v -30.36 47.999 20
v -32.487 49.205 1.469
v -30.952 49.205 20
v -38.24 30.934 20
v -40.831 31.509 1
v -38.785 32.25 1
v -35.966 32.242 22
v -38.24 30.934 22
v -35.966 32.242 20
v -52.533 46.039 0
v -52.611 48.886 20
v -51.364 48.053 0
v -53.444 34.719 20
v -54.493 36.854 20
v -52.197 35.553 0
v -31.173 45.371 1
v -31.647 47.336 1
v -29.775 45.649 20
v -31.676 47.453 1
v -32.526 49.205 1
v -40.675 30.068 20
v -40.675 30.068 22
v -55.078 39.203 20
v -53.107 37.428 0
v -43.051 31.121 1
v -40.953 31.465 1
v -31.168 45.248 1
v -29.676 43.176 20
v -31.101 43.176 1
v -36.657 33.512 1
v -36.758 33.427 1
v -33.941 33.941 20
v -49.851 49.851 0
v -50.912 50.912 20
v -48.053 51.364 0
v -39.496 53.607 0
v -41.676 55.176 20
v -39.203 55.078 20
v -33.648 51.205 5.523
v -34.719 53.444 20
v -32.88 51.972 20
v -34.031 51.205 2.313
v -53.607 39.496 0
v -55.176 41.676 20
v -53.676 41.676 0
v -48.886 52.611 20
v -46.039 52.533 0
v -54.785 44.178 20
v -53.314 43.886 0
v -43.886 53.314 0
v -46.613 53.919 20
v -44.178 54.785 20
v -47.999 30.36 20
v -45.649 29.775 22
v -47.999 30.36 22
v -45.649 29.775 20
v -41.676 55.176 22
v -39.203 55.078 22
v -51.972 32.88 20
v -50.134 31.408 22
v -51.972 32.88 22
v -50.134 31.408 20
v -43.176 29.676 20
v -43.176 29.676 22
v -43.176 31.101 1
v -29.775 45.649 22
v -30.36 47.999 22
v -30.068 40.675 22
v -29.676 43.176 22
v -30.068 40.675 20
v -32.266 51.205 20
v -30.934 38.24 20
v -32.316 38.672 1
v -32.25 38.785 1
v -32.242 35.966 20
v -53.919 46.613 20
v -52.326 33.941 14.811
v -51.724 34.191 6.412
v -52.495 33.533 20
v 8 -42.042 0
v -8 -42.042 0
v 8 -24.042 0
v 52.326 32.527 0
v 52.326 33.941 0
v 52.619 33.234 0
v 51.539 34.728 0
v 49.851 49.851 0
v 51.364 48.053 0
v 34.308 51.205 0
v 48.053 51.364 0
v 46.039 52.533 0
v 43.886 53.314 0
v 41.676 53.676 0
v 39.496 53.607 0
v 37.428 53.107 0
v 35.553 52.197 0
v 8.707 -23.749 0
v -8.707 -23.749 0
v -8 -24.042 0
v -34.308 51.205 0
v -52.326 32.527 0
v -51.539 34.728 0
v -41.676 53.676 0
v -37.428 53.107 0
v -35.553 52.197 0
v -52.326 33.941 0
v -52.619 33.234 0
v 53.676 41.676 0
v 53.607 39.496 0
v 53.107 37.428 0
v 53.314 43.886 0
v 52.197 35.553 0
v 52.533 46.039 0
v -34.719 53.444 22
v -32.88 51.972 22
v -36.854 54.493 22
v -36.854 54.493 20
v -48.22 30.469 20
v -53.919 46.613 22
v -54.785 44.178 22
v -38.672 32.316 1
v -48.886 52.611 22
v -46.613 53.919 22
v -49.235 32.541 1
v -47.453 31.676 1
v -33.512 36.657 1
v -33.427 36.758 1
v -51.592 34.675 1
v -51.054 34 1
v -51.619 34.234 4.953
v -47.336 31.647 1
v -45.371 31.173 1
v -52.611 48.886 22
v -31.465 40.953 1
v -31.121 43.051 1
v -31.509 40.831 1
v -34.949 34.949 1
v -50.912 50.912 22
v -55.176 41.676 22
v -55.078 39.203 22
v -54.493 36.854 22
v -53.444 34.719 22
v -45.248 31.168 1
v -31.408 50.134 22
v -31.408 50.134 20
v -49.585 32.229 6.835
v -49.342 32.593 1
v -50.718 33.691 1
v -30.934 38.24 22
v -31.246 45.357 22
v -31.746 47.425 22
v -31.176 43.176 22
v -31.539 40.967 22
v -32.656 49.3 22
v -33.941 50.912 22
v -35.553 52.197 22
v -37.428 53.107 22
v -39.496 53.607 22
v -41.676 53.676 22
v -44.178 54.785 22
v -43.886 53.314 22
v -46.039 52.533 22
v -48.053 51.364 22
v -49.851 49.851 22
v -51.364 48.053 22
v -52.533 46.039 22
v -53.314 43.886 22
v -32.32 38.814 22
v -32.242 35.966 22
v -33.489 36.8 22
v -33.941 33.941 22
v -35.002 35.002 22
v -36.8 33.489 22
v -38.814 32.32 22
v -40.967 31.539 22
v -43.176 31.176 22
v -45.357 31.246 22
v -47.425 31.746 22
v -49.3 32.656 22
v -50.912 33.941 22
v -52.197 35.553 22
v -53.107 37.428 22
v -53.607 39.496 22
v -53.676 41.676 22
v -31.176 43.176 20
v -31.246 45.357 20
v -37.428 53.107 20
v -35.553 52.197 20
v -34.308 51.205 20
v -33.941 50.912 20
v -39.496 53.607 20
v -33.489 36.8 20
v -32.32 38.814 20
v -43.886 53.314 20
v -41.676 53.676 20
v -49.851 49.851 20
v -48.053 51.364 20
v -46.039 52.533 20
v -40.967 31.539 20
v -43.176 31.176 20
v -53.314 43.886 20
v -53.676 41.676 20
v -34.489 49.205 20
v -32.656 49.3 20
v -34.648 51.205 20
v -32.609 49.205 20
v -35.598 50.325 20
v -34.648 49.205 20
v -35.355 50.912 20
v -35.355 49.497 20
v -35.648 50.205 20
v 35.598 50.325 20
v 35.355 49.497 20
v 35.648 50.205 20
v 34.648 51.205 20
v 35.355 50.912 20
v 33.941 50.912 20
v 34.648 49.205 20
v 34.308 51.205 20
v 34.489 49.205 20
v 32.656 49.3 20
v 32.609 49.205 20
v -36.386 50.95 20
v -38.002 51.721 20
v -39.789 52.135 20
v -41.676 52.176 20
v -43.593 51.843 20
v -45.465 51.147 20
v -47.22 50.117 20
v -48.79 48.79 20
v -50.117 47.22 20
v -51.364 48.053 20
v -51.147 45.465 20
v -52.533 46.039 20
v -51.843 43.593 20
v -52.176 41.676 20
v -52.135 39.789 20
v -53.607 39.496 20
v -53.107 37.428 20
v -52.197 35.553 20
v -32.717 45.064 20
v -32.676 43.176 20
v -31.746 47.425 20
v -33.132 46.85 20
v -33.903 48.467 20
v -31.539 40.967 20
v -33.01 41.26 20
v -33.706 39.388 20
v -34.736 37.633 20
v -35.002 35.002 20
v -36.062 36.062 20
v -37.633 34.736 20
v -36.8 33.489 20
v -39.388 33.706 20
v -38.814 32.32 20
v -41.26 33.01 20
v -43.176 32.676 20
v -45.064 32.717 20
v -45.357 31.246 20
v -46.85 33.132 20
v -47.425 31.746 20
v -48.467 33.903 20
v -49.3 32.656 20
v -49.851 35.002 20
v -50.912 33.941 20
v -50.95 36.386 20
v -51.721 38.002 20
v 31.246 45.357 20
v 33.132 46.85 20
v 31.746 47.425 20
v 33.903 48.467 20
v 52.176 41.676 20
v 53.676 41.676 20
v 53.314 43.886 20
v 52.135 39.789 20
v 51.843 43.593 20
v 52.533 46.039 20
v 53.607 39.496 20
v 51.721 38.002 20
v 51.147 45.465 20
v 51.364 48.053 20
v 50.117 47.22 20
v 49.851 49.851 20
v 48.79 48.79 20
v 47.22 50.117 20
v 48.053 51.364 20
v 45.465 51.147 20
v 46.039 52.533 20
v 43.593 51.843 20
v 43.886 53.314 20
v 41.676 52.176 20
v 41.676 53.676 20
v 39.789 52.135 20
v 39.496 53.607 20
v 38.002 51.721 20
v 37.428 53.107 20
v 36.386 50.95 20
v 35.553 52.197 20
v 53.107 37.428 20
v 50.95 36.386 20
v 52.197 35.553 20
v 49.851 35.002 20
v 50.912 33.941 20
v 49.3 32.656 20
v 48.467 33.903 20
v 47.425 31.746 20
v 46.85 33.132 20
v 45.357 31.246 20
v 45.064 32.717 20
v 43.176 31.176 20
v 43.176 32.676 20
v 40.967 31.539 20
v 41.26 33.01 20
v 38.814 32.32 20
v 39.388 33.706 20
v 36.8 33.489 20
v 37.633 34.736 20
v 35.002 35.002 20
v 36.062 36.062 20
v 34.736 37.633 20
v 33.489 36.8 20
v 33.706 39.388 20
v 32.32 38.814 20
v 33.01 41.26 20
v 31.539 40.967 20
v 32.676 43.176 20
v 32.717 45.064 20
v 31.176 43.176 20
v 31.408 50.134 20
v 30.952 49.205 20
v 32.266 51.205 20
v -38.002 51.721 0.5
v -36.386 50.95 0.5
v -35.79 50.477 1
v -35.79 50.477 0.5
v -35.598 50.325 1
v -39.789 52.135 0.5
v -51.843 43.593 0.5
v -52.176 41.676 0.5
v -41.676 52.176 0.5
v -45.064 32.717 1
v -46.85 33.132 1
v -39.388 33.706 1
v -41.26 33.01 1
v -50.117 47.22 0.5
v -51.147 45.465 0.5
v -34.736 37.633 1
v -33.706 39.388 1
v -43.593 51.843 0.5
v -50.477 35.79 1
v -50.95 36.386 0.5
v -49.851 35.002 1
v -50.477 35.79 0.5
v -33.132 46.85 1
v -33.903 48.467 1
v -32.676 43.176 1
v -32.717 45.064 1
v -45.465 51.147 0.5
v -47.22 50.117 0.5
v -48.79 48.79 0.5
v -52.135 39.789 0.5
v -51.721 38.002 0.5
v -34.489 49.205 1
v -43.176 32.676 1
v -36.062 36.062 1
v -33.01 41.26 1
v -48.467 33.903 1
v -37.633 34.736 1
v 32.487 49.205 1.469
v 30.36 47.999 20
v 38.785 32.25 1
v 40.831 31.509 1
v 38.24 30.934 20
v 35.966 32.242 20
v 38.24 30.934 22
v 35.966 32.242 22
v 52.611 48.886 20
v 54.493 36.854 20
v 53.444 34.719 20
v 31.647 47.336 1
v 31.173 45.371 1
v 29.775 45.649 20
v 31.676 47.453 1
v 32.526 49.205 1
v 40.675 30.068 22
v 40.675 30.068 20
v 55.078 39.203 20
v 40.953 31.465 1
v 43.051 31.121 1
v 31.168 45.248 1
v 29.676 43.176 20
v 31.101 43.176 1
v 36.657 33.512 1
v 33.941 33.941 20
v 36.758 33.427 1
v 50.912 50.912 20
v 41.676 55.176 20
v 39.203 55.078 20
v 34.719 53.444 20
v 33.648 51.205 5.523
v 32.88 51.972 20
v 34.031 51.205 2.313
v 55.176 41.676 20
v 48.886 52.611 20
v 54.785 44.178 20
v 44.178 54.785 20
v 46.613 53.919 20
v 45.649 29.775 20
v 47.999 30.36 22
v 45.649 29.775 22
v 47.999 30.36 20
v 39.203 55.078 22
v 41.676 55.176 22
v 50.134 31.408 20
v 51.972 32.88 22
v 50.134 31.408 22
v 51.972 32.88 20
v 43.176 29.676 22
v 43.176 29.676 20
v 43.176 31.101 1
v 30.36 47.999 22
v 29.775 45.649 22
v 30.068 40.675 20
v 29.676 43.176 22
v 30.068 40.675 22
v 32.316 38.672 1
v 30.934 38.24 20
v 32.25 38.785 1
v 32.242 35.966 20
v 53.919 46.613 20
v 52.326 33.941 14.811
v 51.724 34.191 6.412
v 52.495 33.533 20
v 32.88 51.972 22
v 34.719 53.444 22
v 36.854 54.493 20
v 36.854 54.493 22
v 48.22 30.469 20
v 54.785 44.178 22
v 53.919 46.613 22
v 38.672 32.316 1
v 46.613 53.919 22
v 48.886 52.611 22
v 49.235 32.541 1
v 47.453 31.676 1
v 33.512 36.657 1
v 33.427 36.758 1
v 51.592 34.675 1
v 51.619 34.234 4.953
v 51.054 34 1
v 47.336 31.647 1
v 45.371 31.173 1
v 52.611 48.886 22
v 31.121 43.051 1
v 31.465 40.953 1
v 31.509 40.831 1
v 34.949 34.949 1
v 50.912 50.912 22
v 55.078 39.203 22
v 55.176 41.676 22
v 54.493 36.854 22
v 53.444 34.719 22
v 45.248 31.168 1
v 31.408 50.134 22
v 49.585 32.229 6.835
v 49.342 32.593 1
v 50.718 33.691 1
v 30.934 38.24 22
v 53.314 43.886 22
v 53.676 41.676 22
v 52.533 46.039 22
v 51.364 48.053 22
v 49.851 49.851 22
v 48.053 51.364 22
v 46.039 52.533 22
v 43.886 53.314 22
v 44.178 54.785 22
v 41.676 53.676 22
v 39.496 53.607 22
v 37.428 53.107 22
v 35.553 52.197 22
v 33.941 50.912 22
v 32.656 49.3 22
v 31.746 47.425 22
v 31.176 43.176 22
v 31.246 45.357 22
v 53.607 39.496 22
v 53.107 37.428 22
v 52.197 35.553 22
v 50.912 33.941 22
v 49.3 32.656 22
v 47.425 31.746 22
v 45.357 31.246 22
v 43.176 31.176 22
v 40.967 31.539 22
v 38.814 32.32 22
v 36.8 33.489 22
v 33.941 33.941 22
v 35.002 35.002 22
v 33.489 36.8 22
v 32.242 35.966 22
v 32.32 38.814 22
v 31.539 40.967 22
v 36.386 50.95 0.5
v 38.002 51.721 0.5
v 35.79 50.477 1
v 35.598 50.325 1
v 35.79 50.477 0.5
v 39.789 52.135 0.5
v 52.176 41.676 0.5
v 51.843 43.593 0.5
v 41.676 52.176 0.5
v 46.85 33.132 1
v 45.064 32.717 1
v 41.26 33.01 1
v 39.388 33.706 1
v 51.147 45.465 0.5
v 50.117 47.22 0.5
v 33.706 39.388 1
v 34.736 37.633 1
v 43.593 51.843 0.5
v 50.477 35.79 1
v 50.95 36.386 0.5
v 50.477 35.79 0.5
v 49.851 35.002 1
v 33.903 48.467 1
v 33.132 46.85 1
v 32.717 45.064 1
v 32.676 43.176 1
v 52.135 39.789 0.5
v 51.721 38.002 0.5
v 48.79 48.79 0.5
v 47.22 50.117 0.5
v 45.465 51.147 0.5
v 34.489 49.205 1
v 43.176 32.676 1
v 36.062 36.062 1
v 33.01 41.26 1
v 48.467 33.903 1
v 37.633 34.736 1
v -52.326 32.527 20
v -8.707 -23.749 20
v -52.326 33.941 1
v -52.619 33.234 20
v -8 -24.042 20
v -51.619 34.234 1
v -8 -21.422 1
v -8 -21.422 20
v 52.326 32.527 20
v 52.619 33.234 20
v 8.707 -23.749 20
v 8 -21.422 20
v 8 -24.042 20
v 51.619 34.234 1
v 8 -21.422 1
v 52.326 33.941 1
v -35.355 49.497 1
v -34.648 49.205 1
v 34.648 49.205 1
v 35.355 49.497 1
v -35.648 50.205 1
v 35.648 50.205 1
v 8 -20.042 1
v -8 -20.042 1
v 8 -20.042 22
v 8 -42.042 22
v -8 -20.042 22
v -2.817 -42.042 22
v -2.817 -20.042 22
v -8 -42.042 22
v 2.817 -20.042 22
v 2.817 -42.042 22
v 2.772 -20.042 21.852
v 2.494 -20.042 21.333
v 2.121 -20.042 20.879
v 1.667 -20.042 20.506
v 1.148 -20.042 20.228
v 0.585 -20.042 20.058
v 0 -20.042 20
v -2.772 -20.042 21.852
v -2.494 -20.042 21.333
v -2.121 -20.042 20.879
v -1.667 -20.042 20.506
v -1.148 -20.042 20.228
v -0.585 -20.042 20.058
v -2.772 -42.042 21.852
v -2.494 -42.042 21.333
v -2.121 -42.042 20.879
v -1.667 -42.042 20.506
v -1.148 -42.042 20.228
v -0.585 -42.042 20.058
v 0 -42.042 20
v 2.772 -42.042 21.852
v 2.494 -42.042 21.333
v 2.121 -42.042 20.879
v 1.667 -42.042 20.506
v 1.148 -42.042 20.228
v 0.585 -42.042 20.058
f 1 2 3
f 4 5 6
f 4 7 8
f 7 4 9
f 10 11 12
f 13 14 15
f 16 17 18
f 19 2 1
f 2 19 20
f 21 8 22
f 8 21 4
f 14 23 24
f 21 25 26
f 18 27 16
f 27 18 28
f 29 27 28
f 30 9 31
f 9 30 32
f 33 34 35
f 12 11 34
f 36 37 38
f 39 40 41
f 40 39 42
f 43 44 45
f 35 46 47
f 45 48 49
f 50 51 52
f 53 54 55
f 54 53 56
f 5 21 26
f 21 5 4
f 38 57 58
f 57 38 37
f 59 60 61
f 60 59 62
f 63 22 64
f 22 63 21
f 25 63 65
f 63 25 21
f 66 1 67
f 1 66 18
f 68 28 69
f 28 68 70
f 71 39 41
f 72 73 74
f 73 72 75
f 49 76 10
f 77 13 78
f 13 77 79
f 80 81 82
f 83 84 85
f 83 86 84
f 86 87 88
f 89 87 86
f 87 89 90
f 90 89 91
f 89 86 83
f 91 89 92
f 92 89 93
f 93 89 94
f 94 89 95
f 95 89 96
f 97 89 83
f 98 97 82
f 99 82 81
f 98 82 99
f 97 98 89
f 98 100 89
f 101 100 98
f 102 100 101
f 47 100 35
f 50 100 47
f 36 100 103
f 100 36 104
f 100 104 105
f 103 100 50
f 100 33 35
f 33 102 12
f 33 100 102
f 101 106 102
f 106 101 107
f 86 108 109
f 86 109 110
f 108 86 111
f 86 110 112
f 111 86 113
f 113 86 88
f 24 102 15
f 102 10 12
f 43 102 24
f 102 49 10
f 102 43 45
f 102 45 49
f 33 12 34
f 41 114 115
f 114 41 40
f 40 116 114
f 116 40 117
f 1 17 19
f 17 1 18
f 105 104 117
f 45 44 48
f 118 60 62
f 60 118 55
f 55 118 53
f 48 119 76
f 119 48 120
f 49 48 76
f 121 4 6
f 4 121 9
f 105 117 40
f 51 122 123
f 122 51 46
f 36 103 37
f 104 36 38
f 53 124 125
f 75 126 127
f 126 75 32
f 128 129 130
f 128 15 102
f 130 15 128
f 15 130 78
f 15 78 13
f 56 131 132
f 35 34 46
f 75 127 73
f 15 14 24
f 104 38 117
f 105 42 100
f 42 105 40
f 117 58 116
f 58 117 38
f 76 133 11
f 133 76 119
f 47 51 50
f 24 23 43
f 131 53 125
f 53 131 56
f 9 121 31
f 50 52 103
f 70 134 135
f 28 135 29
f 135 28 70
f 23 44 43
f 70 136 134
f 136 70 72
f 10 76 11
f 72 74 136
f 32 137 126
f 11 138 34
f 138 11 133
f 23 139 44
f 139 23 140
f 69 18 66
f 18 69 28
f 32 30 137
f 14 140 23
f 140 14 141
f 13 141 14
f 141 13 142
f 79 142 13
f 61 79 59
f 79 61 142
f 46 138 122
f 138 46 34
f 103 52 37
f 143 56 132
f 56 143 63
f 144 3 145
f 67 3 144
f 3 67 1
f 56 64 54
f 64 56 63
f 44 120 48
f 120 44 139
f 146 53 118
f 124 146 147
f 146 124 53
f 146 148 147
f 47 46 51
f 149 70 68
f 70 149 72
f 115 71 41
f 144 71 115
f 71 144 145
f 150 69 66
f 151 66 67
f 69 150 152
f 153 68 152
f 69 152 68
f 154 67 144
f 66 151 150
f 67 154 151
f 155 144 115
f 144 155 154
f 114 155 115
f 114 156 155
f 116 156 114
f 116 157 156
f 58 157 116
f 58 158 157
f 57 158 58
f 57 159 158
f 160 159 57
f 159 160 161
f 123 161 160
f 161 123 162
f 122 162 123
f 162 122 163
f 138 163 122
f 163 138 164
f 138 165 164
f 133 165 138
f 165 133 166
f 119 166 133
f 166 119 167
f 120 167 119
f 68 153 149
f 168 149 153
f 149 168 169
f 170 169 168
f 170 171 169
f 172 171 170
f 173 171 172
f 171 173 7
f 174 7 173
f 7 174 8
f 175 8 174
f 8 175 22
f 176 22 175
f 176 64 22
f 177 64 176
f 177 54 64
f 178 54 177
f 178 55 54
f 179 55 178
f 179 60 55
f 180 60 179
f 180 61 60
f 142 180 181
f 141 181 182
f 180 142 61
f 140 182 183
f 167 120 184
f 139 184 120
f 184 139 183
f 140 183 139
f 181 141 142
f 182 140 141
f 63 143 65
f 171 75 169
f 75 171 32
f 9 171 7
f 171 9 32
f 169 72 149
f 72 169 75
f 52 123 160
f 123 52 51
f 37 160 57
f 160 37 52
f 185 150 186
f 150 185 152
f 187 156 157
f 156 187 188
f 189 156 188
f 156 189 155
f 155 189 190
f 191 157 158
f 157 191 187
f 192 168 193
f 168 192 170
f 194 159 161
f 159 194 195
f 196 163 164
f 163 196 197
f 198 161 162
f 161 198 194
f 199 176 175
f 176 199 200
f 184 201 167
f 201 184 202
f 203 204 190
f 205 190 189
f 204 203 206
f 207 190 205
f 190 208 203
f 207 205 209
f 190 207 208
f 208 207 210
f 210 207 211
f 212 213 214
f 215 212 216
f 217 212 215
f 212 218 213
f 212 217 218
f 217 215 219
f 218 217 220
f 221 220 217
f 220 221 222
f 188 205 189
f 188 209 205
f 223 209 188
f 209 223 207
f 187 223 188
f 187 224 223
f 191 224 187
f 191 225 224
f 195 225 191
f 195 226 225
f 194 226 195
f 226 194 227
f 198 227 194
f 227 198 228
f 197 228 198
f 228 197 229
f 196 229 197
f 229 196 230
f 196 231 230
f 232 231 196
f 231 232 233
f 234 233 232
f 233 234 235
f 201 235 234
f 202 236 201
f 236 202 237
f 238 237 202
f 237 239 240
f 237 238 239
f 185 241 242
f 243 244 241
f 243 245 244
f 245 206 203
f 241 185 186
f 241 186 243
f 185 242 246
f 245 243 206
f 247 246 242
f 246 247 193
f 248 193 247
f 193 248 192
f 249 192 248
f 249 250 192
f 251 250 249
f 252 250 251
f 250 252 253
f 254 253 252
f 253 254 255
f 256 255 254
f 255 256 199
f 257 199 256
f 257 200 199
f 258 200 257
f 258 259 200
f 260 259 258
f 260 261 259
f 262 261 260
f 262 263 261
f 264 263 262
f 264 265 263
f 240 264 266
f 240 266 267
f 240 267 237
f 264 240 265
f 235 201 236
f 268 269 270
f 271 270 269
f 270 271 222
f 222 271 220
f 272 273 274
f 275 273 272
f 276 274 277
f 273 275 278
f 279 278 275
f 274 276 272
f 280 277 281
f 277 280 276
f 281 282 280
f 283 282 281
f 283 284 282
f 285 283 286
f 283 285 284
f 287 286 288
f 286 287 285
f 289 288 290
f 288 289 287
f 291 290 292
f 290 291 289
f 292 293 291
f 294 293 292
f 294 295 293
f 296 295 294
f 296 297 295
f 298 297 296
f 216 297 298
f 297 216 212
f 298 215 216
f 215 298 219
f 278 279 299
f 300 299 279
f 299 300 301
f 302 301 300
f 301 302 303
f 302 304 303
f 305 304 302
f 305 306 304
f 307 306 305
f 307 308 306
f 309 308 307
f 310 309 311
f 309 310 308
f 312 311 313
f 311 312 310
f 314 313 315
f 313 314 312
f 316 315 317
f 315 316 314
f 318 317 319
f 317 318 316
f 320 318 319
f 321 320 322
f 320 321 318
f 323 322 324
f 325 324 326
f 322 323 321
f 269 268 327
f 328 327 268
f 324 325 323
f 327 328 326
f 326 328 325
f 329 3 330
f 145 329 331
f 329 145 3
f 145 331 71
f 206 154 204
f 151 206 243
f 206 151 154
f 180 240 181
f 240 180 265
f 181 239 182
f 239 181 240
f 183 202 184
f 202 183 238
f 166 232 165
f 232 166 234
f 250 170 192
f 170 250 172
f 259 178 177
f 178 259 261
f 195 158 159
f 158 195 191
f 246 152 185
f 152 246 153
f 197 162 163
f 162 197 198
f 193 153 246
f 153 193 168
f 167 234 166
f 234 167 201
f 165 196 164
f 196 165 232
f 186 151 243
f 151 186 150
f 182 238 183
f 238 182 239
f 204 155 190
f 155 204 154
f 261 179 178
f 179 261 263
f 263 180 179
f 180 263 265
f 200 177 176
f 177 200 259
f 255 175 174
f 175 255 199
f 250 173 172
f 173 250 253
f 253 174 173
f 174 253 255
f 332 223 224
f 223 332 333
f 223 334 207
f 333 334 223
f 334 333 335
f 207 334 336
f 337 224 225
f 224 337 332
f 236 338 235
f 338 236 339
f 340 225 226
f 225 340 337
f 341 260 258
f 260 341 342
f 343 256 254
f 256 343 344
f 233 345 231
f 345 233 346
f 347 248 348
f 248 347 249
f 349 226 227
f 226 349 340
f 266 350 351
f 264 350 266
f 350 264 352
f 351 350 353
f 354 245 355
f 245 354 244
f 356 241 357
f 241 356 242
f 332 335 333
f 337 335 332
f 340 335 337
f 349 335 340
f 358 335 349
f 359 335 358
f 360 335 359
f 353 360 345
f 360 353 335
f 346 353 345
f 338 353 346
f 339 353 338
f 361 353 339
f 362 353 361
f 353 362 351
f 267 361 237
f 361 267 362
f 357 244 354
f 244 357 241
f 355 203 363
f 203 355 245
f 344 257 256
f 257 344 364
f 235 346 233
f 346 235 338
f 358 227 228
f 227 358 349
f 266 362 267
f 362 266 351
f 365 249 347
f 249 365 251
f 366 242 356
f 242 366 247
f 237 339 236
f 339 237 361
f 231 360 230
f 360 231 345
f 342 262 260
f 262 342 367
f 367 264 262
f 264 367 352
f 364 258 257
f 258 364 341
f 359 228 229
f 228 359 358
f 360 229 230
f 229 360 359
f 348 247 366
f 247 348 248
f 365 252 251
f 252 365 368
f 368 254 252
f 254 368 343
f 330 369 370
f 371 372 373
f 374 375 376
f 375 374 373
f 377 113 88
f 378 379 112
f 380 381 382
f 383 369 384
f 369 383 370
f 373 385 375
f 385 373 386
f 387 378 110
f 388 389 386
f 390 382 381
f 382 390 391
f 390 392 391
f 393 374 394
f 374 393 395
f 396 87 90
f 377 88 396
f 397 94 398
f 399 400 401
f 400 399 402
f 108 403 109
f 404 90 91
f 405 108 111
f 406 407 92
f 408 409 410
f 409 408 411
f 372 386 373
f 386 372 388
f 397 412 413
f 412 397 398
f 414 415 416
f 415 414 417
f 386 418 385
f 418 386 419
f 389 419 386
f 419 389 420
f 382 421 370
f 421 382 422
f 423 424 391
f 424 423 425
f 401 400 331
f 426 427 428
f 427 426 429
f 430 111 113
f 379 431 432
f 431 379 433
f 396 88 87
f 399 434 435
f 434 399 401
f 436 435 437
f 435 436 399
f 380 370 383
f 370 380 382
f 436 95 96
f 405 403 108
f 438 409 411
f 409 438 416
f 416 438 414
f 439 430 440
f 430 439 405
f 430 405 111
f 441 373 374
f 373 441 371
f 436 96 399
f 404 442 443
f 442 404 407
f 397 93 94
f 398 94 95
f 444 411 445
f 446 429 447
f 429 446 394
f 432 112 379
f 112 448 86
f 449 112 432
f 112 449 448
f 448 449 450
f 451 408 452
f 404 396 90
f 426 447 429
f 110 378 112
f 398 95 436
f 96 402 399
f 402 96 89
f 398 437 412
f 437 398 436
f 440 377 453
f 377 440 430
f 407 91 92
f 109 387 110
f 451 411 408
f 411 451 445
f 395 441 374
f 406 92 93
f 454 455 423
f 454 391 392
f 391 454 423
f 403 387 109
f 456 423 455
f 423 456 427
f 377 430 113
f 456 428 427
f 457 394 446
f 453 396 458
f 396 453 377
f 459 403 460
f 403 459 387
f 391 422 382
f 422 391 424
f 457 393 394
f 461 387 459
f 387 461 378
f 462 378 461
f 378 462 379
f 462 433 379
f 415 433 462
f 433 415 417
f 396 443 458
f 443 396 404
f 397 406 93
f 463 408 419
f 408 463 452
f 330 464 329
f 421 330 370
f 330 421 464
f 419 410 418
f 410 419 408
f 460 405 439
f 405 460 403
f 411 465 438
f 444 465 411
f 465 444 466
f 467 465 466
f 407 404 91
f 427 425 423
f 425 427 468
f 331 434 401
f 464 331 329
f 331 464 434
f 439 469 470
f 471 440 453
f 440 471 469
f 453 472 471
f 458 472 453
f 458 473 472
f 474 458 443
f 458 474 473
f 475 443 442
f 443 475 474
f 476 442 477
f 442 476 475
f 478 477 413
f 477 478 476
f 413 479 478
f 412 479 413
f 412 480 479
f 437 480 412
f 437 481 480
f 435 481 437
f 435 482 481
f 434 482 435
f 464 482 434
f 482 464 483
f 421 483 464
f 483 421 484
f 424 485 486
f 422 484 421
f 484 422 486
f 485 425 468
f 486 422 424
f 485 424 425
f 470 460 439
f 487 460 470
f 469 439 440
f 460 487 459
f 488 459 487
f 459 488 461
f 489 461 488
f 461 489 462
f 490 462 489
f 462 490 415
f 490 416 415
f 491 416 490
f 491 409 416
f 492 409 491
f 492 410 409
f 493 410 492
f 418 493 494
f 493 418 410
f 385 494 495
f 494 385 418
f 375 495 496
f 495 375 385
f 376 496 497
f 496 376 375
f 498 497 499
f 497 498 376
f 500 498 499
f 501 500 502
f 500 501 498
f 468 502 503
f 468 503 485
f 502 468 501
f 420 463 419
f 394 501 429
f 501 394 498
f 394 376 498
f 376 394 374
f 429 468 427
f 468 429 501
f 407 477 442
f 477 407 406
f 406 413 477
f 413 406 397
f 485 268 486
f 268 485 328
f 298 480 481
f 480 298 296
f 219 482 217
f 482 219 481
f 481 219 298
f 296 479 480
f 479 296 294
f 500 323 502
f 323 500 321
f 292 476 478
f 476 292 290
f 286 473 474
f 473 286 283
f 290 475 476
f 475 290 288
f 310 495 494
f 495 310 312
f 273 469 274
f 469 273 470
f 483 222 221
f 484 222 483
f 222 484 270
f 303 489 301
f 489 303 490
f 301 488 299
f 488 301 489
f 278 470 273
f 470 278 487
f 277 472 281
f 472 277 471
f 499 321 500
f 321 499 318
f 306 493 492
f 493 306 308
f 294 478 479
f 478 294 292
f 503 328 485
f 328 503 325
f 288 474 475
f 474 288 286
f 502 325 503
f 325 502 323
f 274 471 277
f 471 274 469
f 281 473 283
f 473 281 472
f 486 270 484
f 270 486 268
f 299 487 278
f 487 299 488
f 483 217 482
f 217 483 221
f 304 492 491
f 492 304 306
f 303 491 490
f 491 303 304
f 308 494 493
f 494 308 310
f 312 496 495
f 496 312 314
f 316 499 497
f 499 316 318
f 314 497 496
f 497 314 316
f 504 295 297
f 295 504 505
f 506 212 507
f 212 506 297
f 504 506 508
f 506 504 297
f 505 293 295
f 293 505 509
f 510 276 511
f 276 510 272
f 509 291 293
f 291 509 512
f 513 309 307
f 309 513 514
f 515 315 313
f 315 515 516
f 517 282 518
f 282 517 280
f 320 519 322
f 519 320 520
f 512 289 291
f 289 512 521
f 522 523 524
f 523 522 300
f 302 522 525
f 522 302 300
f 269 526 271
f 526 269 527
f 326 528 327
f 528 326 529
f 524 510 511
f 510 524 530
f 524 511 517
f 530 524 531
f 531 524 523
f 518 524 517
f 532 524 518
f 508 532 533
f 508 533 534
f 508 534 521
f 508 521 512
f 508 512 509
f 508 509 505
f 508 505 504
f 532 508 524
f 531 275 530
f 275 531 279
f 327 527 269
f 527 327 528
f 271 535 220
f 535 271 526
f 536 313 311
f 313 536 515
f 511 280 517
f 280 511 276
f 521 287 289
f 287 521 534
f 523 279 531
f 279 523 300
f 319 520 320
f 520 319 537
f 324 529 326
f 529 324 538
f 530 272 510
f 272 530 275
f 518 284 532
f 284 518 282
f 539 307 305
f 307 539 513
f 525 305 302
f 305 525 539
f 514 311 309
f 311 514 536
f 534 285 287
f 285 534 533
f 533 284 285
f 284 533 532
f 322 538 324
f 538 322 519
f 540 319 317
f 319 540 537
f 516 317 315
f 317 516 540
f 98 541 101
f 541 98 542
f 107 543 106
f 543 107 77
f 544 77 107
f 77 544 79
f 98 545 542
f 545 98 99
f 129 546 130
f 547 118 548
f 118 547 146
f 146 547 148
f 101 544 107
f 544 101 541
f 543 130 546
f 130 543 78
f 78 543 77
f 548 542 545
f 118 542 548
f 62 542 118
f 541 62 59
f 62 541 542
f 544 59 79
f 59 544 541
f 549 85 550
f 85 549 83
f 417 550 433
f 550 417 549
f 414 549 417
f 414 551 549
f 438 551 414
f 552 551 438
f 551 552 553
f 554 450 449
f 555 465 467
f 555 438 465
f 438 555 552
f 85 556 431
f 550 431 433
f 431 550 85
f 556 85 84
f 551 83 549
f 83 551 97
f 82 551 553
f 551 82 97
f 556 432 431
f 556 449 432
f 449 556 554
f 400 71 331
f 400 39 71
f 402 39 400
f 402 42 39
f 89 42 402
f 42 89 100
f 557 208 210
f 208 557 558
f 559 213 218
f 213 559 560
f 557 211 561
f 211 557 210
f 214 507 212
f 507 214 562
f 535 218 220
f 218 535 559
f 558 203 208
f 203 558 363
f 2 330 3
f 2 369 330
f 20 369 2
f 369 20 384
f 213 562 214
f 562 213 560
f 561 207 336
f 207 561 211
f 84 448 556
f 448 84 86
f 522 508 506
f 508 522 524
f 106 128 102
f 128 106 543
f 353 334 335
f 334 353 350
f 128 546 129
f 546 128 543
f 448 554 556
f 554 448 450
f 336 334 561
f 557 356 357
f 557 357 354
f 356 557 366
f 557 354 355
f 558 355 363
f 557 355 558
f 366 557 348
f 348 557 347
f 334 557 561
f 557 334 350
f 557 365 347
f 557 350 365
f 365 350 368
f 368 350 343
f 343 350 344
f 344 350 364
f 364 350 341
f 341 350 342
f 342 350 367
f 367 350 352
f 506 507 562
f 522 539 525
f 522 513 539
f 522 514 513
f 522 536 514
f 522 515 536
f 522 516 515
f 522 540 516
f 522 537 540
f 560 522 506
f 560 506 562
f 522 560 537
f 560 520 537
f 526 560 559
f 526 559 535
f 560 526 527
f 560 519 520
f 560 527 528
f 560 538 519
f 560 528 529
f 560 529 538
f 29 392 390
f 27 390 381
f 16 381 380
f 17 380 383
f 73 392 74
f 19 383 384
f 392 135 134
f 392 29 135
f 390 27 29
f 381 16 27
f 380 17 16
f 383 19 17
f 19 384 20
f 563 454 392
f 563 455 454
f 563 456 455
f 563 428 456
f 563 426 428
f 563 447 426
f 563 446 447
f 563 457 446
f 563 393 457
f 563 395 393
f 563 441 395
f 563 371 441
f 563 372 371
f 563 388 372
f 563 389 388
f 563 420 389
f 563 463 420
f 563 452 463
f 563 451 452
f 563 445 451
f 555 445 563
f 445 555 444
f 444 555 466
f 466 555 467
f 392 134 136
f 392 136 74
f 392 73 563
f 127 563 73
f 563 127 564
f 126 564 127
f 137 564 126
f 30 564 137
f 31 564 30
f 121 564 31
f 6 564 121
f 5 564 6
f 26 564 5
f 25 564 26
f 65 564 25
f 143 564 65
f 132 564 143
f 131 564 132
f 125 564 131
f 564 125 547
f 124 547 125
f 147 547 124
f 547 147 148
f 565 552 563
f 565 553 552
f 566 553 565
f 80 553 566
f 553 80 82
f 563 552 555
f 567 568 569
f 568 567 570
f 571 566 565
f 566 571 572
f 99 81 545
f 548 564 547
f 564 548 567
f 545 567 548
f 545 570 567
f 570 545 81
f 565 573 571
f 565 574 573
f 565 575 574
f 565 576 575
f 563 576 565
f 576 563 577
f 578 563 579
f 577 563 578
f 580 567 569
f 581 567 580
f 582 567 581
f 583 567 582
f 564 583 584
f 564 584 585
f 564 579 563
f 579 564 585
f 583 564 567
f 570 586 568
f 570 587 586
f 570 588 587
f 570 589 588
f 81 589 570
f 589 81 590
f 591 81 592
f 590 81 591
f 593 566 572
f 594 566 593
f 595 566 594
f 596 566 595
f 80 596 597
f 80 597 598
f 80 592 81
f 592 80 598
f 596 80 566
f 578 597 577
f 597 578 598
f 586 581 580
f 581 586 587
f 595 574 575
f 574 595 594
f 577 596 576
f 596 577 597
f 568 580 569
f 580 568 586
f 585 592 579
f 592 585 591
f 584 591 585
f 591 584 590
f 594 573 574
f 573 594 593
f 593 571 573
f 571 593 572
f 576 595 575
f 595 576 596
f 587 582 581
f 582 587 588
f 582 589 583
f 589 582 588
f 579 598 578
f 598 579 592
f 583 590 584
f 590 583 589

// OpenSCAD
// file: microscope_parameters.scad
/******************************************************************
*                                                                 *
* OpenFlexure Microscope: Microscope Parameters                   *
*                                                                 *
* This is the top-level configuration file for the OpenFlexure    *
* microscope, an open microscope and 3-axis translation stage.    *
* It gets really good precision over a ~10mm range, by using      *
* plastic flexure mechanisms.                                     *
*                                                                 *
* Generally I've tried to put parts (or collections of closely    *
* related parts) in their own files.  However, all the parts      *
* depend on the geometry of the microscope - so these parameters  *
* are gathered together here.  In general, the ones you might     *
* to change are towards the top!  Lower-down ones are defined in  *
* terms of higher-up ones - confusion might arise if you redefine *
* these later...                                                  *
*                                                                 *
* (c) Richard Bowman, January 2016                                *
* Released under the CERN Open Hardware License                   *
*                                                                 *
* http://www.github.com/rwb27/openflexure_microscope              *
* http://www.docubricks.com/projects/openflexure-microscope       *
* http://www.waterscope.org                                       *
*                                                                 *
******************************************************************/

d = 0.05;
$fn=32;

// These are the most useful parameters to change!
big_stage = false;
motor_lugs = true;
version_numstring = "5.17.2";
camera = "picamera_2"; //see cameras/camera.scad for valid values
optics = big_stage?"rms_f40d16":"pilens"; //see optics.scad for valid values

// This sets the basic geometry of the microscope
sample_z = big_stage?65:40; // height of the top of the stage
leg_r = big_stage?30:25; // radius of innermost part of legs (stage size)
hole_r = big_stage?15:10; // size of hole in the stage
xy_lever_ratio = big_stage?4.0/7.0:1.0; // mechanical advantage of actuator over stage - can be used to trade speed and precision
z_lever_ratio = big_stage?2.4:2.6; // as above, for Z axis (must be >1)
// The variables below affect the position of the objective mount
z_strut_l = big_stage?20:15; //length of struts supporting Z carriage
objective_clip_y = big_stage?12:6; // y position of clip for optics
objective_clip_w = 10; // width of the dovetail clip for the optics
foot_height = 15; //height of the feet (distance from bottom of body to table)

// These variables set the dimensions of flexures
// You might want to tweak them if your material (or printer)
// is different from the ones I've tested, though ABS/PLA extrusion
// is generally fine with my parameters
stage_flex_w = 4; // width of XY axis flexures
zflex_l = 1.5;    // length of (all) flexible bits
zflex_t = 0.75;   // thickness of (all) flexible bits
zflex = [stage_flex_w, zflex_l, zflex_t]; // the above in new-style format
flex_a = 0.15;    // sine of the angle through which flexures can be bent

// Compile a sensible version string
version_string = str("v",version_numstring, big_stage?"-LS":"-SS", sample_z, motor_lugs?"-M":"");
echo(str("Compiling OpenFlexure Microscope ",version_string));

stage_t=5; //thickness of the XY stage (at thickest point, most is 1mm less)
flex_z1 = 0;      // z position of lower flexures for XY axis
flex_z2 = sample_z-stage_t; //height of upper XY flexures
z_strut_t = 6;  // (z) thickness of struts for Z axis
z_flex_w = 4;   // width of struts for Z axis
leg = [4,stage_flex_w,flex_z2+zflex_t]; // size of vertical legs
leg_middle_w = 12; // width of the middle part of each leg
actuator_h = 25; //height of the actuator columns
dz = 0.5; //small increment in Z (~ 2 layers)

leg_outer_w = leg_middle_w + 2*zflex_l + 2*leg[0]; // overall width of parallelogram legs that support the stagef
actuator = [3*1.2+2*2,(flex_z2 - flex_z1)*xy_lever_ratio,6]; // dimensions of the core part of the actuating levers for X and Y - NB should match the column_base_r in compact_nut_seat.scad
actuating_nut_r = (flex_z2 - flex_z1)*xy_lever_ratio; // distance from leg_r to the actuating nut/screw for the XY axes
xy_actuator_travel = actuating_nut_r*0.15; // distance moved by XY axis actuators
z_flexure_x = (leg_r-zflex_l-max(5,leg[2]*0.1))*sqrt(2); // x position of the outside of the Z-axis static anchors (either side of the XY stage, on the X axis)
z_flexure_spacing = min(flex_z2-actuator[2]-z_strut_l*0.22-2, 30); // distance between the two sets of flexures on the Z axis
z_carriage = [(z_flexure_x-zflex_l*2-z_strut_l)+d,4,z_flexure_spacing+zflex_t]; //size of the moving block for the Z carriage
z_nut_y = (z_strut_l+zflex_l)*z_lever_ratio+zflex_l/2; // position of Z actuator
z_actuator_travel = z_nut_y*0.15; // distance moved by the Z actuator
z_carriage_y = z_strut_l+2*zflex_l; // y position of moving pivot on Z axis
z_link_w = 4; // width of linking bar between top Z-axis flexure struts
bridge_dz = 10; // spacing between thin links on legs
base_t=1; // thickness of the flat base of the structure
wall_h=15; // height of the stiffening vertical(ish) walls
wall_t=2; //thickness of the stiffening walls
zawall_h = z_flexure_spacing - 5; //height of wall near Z anchor
zbwall_h = z_actuator_travel+z_strut_t+1+2; //height of bridge over Z lever
illumination_clip_y = (-(leg_r-zflex_l-wall_t/2+leg_outer_w/2)/sqrt(2)
                       -wall_t/2-1); //position of clip for
                      // illumination/back foot.  This is set to
                      // coincide with the wall between the back
                      // two legs.
illumination_arm_screws = [[0,illumination_clip_y+3,0],
                           [-z_flexure_x+3,-3,0],
                           [z_flexure_x-3,-3,0]];
                      // positions of screws that mount the adjustable version of the 
                      // illumination arm
condenser_clip_y = -8; //position of dovetail for condenser assembly
base_mounting_holes = [[-20,z_nut_y-4,0],[20,z_nut_y-4,0],[-z_flexure_x-4,-8,0],[z_flexure_x+4,-8,0]]; // holes to screw the microscope to a baseplate
// file: logo.scad
/******************************************************************
*                                                                 *
* OpenFlexure Microscope: WaterScope logo                         *
*                                                                 *
* This file draws the WaterScope logo.                            *
*                                                                 *
* This is part of the OpenFlexure microscope, an open-source      *
* microscope and 3-axis translation stage.  It gets really good   *
* precision over a ~10mm range, by using plastic flexure          *
* mechanisms.                                                     *
*                                                                 *
* WaterScope is a company that uses the microscope, and will      *
* hopefully sell it quite soon.                                   *
*                                                                 *
* (c) Richard Bowman, January 2016                                *
* Released under the CERN Open Hardware License                   *
*                                                                 *
******************************************************************/

use <utilities.scad>;

$fn=64;

module waterscope_logo(){
    difference(){
        //eye shape
        intersection(){
            translate([0,13,0]) cylinder(r=30,h=1);
            translate([0,-13,0]) cylinder(r=30,h=1);
        }
        
        //tear-drop shaped pupil
        difference(){
            translate([0,-((12-1)*sqrt(2)+1 - 12)/2,0]) hull(){
                cylinder(r=12,h=999,center=true);
                translate([0,(12-1)*sqrt(2),0])cylinder(r=1,h=999,center=true);
            }
            
            //tick
            translate([2,-11,0]) sequential_hull(){
                translate([-3,3,0]) cylinder(r=1,h=1);
                translate([0,0,0]) cylinder(r=1,h=1);
                translate([6,6,0]) cylinder(r=1,h=1);
            }
        }
    }
}

module oshw_logo(){
    linear_extrude(1) translate([-17.5,-16]) resize([35,0],auto=true) import("oshw_gear.dxf");
}

module logo_and_name(subtitle=""){
    union(){
        waterscope_logo();
        
        translate([30,-6,0]) linear_extrude(1){
            text("WaterScope", size=15, font="Calibri");
        }
        translate([110,-17,0]) linear_extrude(1){
            text(subtitle, size=9, font="Calibri", halign="right");
        }
    }
}

logo_and_name("v5.15.2-LS-M");
translate([0,-40,0]) oshw_logo();
// main file
/******************************************************************
*                                                                 *
* OpenFlexure Microscope: Microscope baseplate                    *
*                                                                 *
* This part fits undern     *
*                                                                 *
* (c) Richard Bowman, December 2016                               *
* Released under the CERN Open Hardware License                   *
*                                                                 *
******************************************************************/

use <./utilities.scad>;
use <./nut_seat_with_flex.scad>;
use <./logo.scad>;               
use <./dovetail.scad>;
include <./microscope_parameters.scad>; //All the geometric variables are now in here.
h = 35; //height of microscope above bottom
wall_height = h - foot_height; //height of wall

module leg_frame(angle){
    // Transform into the frame of one of the legs of the stage
	rotate(angle) translate([0,leg_r,]) children();
}

module add_hull_base(h=1){
    // Take the convex hull of some objects, and add it in as a
    // thin layer at the bottom
    union(){
        intersection(){
            hull() children();
            cylinder(r=9999,$fn=8,h=h); //make the base thin
        }
        children();
    }
}

module screw_seat_cup(h=20){
	ss=ss_outer(999);
    t=3;
	difference(){
        hull(){
            resize([ss[0],ss[1],d]) cylinder(r=ss[1], h=1, $fn=32); //body
            translate([0,0,h]) resize([ss[0]+3,ss[1]+3,2]) cylinder(r=ss[1], h=1, $fn=32); //body
        }
        
        //hole for the foot
        translate([0,0,h]) resize(ss) cylinder(r=ss[1], h=1, $fn=32); 
        translate([0,0,0.5]) resize(ss-[3,3,0]) cylinder(r=ss[1], h=1, $fn=32);
    }
}

///////////////////// MAIN STRUCTURE STARTS HERE ///////////////
union(){
	//Actuator housings (screw seats and motor mounts)
	reflect([1,0,0]) leg_frame(45) translate([0,actuating_nut_r,0]){
        screw_seat_cup(h=h-foot_height);
    }
    add_hull_base(1){
        //wall between the cups
        hull() reflect([1,0,0]) leg_frame(45) translate([0,actuating_nut_r,0]){
            ss = ss_outer(0);
            translate([ss[0]/2-1,0,0]) cylinder(d=2, h=wall_height,$fn=8);
        }
        
        //cups to plate
        reflect([1,0,0]) hull(){
            translate([-8,illumination_clip_y+3,0])
            cylinder(d=2, h=wall_height,$fn=8);
        
            leg_frame(45) translate([0,actuating_nut_r,0]){
                ss = ss_outer(0);
                translate([-ss[0]/2-1,0,0]) cylinder(d=2, h= wall_height,$fn=8);
            }
        }
    }
//    hull()
//    {
//        translate([-8,illumination_clip_y+3,0])
//        cylinder(d=2, h=wall_height,$fn=8);
//        
//        translate([-ss[0]/2-1,0,0]) cylinder(d=2, h=2*wall_height,$fn=8);
//    }
    
//	translate([0,z_nut_y,0]){
//        screw_seat(travel=z_actuator_travel, motor_lugs=motor_lugs);
//    }
	////////////// clip for illumination/back foot ///////////////////
	//translate([0,illumination_clip_y,0]) mirror([0,1,0]) dovetail_m([12,2,12]);
    difference(){
        translate([-8,illumination_clip_y-16,0]) cube([16,22,wall_height+2]);
        translate([0,0,wall_height+3]) rotate([90,0,0]) cylinder(r=3,h=999,center=true);
    }
}

//%rotate(180) translate([0,2.5,-2]) cube([25,24,2],center=true);
